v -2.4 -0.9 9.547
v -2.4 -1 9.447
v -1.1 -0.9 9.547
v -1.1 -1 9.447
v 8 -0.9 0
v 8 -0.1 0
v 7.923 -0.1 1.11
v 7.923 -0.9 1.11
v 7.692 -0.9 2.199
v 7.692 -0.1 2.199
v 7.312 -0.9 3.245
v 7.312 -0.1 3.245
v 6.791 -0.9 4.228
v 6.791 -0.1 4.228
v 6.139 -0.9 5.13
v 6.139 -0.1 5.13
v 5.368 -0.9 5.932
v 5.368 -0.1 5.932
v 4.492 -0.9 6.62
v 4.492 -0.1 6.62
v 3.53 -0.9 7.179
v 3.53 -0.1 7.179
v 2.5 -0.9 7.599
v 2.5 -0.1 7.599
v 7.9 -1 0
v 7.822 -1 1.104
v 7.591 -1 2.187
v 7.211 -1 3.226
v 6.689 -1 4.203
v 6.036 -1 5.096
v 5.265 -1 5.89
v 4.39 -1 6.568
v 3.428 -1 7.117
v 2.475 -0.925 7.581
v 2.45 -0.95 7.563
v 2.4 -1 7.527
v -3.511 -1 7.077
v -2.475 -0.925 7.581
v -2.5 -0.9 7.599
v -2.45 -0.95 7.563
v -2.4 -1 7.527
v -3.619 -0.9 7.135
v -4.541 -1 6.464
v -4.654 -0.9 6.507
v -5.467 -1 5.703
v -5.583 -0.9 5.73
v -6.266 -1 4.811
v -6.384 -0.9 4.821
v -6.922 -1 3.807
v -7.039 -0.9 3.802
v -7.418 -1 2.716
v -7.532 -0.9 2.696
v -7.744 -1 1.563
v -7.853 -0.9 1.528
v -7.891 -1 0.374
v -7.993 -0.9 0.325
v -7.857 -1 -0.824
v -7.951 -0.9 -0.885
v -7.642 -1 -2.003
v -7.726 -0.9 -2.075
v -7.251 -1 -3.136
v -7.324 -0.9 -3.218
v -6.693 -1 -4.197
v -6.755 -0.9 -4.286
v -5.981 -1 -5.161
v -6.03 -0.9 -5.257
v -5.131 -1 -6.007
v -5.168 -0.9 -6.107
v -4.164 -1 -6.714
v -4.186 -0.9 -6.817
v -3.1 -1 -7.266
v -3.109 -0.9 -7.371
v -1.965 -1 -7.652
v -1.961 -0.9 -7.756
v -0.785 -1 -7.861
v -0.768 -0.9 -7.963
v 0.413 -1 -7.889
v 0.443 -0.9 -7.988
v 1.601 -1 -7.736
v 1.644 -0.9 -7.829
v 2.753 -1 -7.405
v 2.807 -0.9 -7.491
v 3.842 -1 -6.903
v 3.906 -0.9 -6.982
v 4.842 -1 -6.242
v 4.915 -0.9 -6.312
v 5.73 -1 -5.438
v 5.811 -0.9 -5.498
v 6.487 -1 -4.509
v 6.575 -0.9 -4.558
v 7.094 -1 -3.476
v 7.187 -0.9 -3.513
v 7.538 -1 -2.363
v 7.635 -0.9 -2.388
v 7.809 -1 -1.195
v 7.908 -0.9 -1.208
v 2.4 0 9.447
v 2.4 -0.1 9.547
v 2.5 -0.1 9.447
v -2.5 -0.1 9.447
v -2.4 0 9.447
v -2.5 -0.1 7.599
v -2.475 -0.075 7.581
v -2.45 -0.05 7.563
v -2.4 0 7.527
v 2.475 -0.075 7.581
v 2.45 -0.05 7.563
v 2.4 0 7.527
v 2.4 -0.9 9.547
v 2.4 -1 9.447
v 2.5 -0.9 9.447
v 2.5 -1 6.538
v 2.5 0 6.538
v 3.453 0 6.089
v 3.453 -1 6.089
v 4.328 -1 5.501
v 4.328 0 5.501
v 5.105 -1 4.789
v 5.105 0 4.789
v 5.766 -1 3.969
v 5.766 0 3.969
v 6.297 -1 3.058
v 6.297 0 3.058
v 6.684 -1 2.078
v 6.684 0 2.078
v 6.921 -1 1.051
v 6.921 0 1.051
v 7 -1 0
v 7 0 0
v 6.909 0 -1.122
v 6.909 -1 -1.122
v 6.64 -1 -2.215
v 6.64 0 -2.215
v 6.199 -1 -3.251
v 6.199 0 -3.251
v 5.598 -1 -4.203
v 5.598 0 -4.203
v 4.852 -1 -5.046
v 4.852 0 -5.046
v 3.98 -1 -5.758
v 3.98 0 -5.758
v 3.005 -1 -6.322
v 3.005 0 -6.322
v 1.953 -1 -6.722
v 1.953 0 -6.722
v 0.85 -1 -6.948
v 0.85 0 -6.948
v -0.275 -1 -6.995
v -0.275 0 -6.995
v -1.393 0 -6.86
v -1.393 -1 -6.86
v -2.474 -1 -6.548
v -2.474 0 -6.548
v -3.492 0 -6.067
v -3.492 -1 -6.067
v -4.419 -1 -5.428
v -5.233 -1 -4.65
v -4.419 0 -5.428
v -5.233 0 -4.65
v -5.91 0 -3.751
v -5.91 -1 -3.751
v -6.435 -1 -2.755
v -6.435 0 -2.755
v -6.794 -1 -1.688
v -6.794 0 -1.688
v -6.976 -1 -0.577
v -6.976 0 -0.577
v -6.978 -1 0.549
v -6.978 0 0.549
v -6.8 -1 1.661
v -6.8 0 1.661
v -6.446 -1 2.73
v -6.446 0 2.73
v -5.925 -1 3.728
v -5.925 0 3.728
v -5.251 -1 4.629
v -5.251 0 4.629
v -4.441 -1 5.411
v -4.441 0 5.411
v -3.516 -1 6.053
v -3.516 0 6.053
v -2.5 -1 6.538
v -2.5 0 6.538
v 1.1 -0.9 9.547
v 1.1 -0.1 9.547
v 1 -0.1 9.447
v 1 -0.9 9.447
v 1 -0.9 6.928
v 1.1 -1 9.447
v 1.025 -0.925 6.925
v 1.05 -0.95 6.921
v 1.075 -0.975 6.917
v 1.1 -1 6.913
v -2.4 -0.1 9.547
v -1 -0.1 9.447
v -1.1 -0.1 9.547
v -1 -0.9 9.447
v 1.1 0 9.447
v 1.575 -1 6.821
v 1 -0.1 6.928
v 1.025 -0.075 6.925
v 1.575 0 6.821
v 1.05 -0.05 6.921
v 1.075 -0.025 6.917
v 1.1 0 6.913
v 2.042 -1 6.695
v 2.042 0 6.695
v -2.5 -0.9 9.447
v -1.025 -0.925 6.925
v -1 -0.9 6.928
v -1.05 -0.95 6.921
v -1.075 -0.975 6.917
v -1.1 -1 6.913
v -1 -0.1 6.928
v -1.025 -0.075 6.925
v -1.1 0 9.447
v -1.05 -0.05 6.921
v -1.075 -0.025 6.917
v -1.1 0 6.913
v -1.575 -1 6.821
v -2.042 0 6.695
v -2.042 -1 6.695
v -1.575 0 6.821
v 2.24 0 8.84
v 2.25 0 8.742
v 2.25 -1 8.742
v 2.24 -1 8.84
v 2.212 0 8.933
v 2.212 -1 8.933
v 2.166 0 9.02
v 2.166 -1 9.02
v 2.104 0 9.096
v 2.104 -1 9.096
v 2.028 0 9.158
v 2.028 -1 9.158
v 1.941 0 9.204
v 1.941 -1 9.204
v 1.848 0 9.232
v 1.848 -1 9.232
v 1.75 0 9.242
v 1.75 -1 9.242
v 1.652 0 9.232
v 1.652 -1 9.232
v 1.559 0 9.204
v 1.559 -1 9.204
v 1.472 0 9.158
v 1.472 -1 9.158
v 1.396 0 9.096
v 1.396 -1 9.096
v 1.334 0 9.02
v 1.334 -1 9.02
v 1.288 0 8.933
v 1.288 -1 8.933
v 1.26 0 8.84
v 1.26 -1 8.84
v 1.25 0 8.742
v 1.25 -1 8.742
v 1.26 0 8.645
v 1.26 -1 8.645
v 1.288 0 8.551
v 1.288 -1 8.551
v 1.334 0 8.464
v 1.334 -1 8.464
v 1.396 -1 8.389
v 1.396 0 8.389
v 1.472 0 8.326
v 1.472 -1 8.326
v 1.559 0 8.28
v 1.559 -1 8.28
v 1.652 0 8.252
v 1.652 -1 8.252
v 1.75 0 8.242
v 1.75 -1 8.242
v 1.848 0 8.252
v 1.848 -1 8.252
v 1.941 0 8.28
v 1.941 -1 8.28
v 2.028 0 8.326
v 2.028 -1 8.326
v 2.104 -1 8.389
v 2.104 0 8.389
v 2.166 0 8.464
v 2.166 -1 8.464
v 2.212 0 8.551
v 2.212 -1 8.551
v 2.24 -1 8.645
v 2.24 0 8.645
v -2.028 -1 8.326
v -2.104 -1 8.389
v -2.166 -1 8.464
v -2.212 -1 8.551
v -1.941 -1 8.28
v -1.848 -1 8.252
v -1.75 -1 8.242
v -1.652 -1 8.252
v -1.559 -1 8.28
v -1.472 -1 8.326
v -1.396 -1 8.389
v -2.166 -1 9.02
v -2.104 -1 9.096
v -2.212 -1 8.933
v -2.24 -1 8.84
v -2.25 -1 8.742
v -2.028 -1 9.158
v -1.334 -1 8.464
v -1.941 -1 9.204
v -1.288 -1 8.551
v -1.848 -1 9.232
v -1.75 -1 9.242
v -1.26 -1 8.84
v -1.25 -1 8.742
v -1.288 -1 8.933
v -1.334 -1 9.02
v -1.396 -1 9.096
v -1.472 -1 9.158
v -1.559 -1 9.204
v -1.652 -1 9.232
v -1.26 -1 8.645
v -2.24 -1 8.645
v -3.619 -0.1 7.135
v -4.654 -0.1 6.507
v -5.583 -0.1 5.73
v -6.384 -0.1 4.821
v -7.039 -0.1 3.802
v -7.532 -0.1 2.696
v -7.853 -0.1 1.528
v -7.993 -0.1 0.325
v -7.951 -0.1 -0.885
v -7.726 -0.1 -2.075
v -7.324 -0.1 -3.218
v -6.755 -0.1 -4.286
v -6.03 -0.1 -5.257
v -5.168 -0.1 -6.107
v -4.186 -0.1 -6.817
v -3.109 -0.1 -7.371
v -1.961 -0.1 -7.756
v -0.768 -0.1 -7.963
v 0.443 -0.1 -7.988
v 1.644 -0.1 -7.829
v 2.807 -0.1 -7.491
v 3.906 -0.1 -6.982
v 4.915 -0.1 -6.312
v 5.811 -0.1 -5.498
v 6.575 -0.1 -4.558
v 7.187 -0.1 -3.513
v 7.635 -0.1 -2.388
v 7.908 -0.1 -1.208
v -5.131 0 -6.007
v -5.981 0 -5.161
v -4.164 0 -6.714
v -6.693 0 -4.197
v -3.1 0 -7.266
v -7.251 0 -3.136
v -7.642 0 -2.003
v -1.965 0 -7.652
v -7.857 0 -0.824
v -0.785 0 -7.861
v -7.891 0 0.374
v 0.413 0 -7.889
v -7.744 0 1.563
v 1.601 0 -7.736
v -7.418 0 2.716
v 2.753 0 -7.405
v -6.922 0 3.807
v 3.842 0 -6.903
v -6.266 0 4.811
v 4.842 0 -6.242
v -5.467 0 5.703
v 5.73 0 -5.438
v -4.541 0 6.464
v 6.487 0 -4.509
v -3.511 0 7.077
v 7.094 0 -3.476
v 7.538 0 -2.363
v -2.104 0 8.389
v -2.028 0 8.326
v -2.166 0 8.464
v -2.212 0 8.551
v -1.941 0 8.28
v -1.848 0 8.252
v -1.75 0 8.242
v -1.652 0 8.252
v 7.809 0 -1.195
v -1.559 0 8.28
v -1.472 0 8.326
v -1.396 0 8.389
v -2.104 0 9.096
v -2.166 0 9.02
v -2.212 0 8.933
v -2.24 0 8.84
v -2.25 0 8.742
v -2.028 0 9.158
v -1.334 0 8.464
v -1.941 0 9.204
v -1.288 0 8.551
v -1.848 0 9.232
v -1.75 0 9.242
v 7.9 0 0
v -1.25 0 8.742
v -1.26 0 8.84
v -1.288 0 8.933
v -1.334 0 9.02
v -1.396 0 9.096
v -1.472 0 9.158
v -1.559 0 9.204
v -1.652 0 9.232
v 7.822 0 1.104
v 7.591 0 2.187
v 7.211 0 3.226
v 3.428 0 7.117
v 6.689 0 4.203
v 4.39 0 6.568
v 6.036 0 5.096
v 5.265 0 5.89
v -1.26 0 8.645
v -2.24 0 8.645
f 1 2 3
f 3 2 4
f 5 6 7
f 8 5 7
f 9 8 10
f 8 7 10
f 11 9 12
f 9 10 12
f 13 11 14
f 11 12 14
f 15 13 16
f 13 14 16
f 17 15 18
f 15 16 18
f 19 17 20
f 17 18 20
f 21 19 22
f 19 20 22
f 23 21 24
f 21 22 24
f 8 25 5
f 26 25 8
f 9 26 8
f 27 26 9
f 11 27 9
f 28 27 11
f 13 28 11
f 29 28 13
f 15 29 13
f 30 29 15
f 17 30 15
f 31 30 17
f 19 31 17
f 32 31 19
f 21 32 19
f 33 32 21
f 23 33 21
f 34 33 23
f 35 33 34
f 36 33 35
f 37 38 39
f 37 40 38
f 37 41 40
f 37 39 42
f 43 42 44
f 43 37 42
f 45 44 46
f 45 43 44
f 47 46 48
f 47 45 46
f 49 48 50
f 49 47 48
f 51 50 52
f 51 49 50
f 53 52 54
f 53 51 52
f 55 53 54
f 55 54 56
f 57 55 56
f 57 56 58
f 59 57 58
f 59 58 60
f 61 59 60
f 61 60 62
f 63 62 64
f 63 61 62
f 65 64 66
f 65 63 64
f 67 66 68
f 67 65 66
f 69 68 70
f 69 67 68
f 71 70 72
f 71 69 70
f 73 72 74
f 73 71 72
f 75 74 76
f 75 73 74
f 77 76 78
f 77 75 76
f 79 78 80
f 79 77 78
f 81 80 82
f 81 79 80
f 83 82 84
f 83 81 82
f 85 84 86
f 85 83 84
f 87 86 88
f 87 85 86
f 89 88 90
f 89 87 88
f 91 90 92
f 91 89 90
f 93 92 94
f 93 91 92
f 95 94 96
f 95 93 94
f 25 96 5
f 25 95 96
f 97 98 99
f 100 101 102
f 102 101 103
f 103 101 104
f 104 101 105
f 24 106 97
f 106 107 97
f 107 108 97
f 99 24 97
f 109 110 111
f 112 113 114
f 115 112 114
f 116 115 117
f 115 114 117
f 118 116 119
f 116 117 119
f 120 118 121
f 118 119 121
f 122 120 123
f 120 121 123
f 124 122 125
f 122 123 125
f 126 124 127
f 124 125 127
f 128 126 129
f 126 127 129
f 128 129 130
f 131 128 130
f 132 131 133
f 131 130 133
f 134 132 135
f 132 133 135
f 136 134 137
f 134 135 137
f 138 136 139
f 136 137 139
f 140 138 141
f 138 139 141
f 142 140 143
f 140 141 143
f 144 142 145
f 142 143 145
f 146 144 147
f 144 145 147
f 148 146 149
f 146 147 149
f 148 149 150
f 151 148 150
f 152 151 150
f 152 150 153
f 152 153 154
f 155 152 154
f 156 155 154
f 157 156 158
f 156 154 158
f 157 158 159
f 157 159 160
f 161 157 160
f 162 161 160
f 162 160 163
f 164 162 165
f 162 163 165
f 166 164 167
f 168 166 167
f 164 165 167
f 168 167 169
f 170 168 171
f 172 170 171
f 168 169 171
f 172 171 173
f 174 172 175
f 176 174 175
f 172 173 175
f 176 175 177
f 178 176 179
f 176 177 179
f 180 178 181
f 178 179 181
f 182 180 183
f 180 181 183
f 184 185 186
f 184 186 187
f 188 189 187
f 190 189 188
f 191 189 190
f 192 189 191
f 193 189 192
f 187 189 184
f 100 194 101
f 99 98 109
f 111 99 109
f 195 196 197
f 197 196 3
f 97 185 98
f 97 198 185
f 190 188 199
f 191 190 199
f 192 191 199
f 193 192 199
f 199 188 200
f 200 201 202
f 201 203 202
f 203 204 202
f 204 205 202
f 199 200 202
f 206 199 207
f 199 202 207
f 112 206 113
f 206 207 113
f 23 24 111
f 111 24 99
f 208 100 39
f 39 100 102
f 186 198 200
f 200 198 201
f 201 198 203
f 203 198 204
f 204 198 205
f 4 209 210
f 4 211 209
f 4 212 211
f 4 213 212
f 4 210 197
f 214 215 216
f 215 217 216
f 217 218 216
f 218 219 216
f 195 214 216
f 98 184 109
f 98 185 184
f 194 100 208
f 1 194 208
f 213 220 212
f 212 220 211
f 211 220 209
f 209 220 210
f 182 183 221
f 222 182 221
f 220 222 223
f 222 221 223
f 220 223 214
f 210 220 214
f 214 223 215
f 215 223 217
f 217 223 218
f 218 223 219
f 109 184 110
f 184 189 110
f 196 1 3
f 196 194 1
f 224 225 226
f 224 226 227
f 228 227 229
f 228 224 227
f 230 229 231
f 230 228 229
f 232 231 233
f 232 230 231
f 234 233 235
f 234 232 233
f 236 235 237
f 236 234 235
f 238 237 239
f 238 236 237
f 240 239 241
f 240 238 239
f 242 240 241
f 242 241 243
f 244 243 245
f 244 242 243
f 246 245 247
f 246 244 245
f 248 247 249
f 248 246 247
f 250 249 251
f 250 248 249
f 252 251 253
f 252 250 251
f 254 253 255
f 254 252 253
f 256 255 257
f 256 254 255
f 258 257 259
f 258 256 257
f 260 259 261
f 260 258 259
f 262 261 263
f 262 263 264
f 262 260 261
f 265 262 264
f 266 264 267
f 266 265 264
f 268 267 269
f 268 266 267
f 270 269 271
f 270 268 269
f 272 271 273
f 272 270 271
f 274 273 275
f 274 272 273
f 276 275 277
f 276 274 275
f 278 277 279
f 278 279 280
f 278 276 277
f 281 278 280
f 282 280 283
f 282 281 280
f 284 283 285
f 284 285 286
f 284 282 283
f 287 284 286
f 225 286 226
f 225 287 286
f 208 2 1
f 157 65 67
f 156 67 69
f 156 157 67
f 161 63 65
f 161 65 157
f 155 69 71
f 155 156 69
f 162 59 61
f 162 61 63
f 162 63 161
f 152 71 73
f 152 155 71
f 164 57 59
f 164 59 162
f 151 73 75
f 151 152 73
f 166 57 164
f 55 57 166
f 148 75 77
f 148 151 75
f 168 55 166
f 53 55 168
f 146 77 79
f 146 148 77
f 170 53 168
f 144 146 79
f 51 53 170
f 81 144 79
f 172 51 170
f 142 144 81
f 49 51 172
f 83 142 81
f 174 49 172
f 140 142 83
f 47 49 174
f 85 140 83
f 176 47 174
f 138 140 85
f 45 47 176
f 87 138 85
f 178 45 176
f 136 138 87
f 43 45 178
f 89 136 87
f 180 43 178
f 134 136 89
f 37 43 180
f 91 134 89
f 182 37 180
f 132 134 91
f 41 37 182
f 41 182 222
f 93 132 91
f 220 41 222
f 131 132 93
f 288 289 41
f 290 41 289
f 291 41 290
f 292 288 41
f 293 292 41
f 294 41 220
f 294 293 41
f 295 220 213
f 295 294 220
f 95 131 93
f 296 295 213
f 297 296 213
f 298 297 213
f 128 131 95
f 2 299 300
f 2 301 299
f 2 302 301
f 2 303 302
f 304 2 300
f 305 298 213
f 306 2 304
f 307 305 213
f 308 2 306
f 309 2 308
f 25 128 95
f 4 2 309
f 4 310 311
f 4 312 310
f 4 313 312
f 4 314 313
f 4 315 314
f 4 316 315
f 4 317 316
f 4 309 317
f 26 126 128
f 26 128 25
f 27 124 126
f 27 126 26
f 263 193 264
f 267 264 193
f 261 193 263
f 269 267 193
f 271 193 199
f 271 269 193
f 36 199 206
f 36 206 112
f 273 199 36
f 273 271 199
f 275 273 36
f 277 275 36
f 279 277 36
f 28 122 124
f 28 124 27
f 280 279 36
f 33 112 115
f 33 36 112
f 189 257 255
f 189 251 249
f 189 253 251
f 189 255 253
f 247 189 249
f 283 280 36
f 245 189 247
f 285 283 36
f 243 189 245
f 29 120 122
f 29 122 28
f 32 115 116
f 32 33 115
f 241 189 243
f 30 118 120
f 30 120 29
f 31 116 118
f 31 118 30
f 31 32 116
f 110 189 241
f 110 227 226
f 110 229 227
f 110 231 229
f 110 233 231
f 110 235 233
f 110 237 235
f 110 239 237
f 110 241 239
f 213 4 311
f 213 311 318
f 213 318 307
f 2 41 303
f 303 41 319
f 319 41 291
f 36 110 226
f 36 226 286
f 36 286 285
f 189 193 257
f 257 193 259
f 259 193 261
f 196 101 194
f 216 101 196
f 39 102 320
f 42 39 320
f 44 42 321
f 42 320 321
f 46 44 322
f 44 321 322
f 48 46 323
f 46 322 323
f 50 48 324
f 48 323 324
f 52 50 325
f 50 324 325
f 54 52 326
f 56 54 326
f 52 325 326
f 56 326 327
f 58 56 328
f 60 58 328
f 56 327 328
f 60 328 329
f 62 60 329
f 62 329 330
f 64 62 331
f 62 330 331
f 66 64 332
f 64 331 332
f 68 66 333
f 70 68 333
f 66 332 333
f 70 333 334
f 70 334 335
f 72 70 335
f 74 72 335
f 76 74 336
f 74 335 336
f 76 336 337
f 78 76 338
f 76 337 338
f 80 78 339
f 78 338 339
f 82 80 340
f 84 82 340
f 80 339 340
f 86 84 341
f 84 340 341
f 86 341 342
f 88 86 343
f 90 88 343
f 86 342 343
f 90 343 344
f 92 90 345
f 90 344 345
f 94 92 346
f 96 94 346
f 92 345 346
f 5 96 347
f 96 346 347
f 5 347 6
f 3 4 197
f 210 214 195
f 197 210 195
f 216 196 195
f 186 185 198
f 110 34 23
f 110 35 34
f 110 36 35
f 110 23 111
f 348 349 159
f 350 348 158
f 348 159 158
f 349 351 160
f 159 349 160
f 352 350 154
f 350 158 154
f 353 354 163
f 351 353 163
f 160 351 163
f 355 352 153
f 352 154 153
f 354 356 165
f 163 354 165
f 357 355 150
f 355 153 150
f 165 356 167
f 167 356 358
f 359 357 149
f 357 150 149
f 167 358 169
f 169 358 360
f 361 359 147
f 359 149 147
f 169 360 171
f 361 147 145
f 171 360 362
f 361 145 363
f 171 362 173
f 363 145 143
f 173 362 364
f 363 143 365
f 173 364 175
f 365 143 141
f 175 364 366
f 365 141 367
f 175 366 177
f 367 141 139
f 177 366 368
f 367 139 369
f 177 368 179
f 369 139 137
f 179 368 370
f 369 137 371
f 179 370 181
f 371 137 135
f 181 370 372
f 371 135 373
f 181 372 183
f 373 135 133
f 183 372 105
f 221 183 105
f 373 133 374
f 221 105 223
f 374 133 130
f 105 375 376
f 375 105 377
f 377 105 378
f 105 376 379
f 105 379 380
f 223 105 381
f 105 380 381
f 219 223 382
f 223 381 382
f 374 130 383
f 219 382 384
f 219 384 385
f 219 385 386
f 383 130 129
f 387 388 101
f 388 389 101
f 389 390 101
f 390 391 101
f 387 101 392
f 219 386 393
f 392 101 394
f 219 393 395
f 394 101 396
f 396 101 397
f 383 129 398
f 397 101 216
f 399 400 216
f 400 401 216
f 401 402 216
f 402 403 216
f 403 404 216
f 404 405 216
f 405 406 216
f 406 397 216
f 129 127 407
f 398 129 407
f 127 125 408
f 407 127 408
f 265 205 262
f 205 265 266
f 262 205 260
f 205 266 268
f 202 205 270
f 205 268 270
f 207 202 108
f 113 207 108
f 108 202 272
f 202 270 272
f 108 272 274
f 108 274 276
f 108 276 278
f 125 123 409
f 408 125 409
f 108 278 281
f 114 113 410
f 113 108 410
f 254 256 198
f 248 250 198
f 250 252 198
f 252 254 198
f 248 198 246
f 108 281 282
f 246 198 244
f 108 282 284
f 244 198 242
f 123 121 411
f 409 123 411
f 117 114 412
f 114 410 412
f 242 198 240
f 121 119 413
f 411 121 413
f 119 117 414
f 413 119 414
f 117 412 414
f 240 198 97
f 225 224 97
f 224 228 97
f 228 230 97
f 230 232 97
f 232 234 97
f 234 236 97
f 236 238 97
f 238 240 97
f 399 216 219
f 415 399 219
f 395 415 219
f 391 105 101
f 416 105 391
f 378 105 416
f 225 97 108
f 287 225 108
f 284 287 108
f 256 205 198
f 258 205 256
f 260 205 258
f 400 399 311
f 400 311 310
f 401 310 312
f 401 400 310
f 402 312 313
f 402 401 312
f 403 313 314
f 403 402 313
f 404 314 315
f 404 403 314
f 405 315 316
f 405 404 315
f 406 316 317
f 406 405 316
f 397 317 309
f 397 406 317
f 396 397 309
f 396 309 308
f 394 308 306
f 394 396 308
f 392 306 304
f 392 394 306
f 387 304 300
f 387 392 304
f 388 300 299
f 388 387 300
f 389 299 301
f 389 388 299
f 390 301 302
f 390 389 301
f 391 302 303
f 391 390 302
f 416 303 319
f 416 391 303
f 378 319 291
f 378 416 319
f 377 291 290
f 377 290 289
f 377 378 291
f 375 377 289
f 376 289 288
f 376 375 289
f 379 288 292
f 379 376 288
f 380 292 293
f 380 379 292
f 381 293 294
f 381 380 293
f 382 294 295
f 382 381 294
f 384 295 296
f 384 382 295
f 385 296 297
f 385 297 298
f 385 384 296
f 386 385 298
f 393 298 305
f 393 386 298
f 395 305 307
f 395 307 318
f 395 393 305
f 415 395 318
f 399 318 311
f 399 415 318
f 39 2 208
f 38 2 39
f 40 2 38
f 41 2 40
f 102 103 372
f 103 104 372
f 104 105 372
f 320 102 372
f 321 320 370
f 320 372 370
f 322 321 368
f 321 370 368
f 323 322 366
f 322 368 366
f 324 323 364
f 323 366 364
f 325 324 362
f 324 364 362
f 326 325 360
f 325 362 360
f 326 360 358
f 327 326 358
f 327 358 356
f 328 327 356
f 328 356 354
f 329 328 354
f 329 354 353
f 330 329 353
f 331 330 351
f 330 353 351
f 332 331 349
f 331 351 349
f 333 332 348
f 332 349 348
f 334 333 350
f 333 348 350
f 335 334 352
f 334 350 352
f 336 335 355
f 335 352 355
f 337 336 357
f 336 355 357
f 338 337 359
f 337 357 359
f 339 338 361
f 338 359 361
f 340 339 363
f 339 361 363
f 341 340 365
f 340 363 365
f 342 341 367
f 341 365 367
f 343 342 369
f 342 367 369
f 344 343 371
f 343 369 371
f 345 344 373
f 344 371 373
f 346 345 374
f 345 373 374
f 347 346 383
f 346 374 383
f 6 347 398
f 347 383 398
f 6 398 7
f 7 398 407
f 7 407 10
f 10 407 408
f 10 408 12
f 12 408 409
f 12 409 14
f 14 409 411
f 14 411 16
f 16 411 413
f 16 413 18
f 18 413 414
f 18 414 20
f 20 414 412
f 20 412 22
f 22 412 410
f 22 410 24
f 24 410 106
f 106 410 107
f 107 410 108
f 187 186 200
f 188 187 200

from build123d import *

# Parameters (mm, degrees)
F0_W     = 1.5
F0_H     = 1.609648519
F0_R     = 0.5
F1_DEPTH = 1
F2_SIZE  = 0.1


with BuildPart() as f1:
    # F0 (on Front) → F1 (new body)
    with BuildSketch(Plane.XZ):
        with BuildLine():
            Line((2.5, 7.9372539332), (1, 7.9372539332))
            ThreePointArc((1, 7.9372539332), (1.7581371123, 7.8044188697), (2.5, 7.5993420768))
            Line((2.5, 7.5993420768), (2.5, 7.9372539332))
        make_face()
        with BuildLine():
            ThreePointArc((-2.5, 7.5993420768), (-1.7581371123, 7.8044188697), (-1, 7.9372539332))
            Line((-1, 7.9372539332), (-2.5, 7.9372539332))
            Line((-2.5, 7.9372539332), (-2.5, 7.5993420768))
        make_face()
        with Locations((-1.75, 8.7420781927)):
            Rectangle(F0_W, F0_H)
        with Locations((-1.75, 8.7420781927)):
            Circle(F0_R, mode=Mode.SUBTRACT)
        with Locations((1.75, 8.7420781927)):
            Rectangle(F0_W, F0_H)
        with Locations((1.75, 8.7420781927)):
            Circle(F0_R, mode=Mode.SUBTRACT)
        with BuildLine():
            ThreePointArc((8, 0), (6.4807406984, 4.6904157598), (2.5, 7.5993420768))
            Line((2.5, 7.5993420768), (2.5, 6.5383484153))
            ThreePointArc((2.5, 6.5383484153), (5.7662812973, 3.9686269666), (7, 0))
            ThreePointArc((7, 0), (-3.9686269666, -5.7662812973), (-2.5, 6.5383484153))
            Line((-2.5, 6.5383484153), (-2.5, 7.5993420768))
            ThreePointArc((-2.5, 7.5993420768), (-4.6904157598, -6.4807406984), (8, 0))
        make_face()
        with BuildLine():
            ThreePointArc((2.5, 7.5993420768), (1.7581371123, 7.8044188697), (1, 7.9372539332))
            Line((1, 7.9372539332), (1, 6.9282032303))
            ThreePointArc((1, 6.9282032303), (1.7608227322, 6.7749172176), (2.5, 6.5383484153))
            Line((2.5, 6.5383484153), (2.5, 7.5993420768))
        make_face()
        with BuildLine():
            Line((-1, 6.9282032303), (-1, 7.9372539332))
            ThreePointArc((-1, 7.9372539332), (-1.7581371123, 7.8044188697), (-2.5, 7.5993420768))
            Line((-2.5, 7.5993420768), (-2.5, 6.5383484153))
            ThreePointArc((-2.5, 6.5383484153), (-1.7608227322, 6.7749172176), (-1, 6.9282032303))
        make_face()
    extrude(amount=F1_DEPTH)

    # F2
    f2_edges = [f1.edges().sort_by_distance(p)[0] for p in [
        (-1.75, -1, 9.546902),
        (-1, -1, 8.237553),
        (-2.5, -1, 8.573122),
        (0, -1, -8),
        (2.5, -1, 8.573122),
        (1.75, -1, 9.546902),
        (1, -1, 8.237553),
        (1.75, 0, 9.546902),
        (1, -0.5, 9.546902),
        (2.5, -0.5, 9.546902),
        (-1, -0.5, 9.546902),
        (-1.75, 0, 9.546902),
        (-2.5, -0.5, 9.546902),
        (-1, 0, 8.237553),
        (1, 0, 8.237553),
        (2.5, 0, 8.573122),
        (-2.5, 0, 8.573122),
        (0, 0, -8),
    ]]
    chamfer(f2_edges, length=F2_SIZE)


solid = f1.part
